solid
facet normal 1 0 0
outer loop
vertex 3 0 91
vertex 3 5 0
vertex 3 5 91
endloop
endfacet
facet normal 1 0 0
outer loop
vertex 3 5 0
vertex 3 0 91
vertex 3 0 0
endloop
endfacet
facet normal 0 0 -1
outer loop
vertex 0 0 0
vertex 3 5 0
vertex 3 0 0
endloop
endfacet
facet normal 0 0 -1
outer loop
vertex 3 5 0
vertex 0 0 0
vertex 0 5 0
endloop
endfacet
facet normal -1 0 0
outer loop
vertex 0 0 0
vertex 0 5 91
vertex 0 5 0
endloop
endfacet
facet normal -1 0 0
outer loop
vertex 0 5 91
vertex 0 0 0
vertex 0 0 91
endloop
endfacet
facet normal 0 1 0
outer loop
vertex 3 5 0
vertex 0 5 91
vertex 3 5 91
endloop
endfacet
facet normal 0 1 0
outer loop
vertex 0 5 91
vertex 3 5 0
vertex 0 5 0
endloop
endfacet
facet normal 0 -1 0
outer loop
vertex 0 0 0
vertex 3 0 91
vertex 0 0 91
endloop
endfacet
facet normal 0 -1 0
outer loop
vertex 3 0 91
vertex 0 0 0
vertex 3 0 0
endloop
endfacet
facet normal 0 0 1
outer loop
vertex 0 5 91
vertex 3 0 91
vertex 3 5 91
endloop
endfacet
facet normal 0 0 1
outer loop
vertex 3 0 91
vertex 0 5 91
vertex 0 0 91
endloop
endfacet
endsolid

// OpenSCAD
translate([1.5, 2.5, 1.0]) color([0.9086575543967805, 0.4740046511372964, 0.8408483326276716]) cube([3, 5, 2], center=true);
translate([1.5, 2.5, 3.0]) color([0.976229457649057, 0.34365159365776776, 0.4790865191519861]) cube([3, 5, 2], center=true);
translate([1.5, 2.5, 5.0]) color([0.6995952911506185, 0.42653532354402823, 0.30190311621935595]) cube([3, 5, 2], center=true);
translate([1.5, 2.5, 7.0]) color([0.7347509912186152, 0.8943997782145745, 0.9196888444316101]) cube([3, 5, 2], center=true);
translate([1.5, 2.5, 9.0]) color([0.6267420468068673, 0.3755713463285453, 0.9745605214796941]) cube([3, 5, 2], center=true);
translate([1.5, 2.5, 11.0]) color([0.6388785175004733, 0.06583467727730097, 0.08466956912011114]) cube([3, 5, 2], center=true);
translate([1.5, 2.5, 13.0]) color([0.749869571783086, 0.06115615654596607, 0.007851005331251826]) cube([3, 5, 2], center=true);
translate([1.5, 2.5, 17.5]) color([0.39380795178170946, 0.5190037287013293, 0.44854428559655457]) cube([3, 5, 7], center=true);
translate([1.5, 2.5, 24.5]) color([0.48861880442715255, 0.5848887019932744, 0.6793025673721249]) cube([3, 5, 7], center=true);
translate([1.5, 2.5, 31.5]) color([0.4230380735074225, 0.3683314563344259, 0.9884590580992895]) cube([3, 5, 7], center=true);
translate([1.5, 2.5, 38.5]) color([0.26091653544625626, 0.7771001545085096, 0.43122102463204415]) cube([3, 5, 7], center=true);
translate([1.5, 2.5, 45.5]) color([0.35852038200953895, 0.06385794894382868, 0.8635789443020424]) cube([3, 5, 7], center=true);
translate([1.5, 2.5, 52.5]) color([0.7020041497619371, 0.9030107075409272, 0.4516117926868677]) cube([3, 5, 7], center=true);
translate([1.5, 2.5, 59.5]) color([0.6769209668166035, 0.11891028655385572, 0.3979536016023134]) cube([3, 5, 7], center=true);
translate([1.5, 2.5, 66.5]) color([0.20723197341708288, 0.04210142789066196, 0.94796135125632]) cube([3, 5, 7], center=true);
translate([1.5, 2.5, 73.5]) color([0.21589436846535714, 0.1463544898080057, 0.19797004355794223]) cube([3, 5, 7], center=true);
translate([1.5, 2.5, 80.5]) color([0.37803196431429753, 0.5463912623151137, 0.15133436847289106]) cube([3, 5, 7], center=true);
translate([1.5, 2.5, 87.5]) color([0.9886898889857565, 0.9829892105452821, 0.14840201708602985]) cube([3, 5, 7], center=true);
